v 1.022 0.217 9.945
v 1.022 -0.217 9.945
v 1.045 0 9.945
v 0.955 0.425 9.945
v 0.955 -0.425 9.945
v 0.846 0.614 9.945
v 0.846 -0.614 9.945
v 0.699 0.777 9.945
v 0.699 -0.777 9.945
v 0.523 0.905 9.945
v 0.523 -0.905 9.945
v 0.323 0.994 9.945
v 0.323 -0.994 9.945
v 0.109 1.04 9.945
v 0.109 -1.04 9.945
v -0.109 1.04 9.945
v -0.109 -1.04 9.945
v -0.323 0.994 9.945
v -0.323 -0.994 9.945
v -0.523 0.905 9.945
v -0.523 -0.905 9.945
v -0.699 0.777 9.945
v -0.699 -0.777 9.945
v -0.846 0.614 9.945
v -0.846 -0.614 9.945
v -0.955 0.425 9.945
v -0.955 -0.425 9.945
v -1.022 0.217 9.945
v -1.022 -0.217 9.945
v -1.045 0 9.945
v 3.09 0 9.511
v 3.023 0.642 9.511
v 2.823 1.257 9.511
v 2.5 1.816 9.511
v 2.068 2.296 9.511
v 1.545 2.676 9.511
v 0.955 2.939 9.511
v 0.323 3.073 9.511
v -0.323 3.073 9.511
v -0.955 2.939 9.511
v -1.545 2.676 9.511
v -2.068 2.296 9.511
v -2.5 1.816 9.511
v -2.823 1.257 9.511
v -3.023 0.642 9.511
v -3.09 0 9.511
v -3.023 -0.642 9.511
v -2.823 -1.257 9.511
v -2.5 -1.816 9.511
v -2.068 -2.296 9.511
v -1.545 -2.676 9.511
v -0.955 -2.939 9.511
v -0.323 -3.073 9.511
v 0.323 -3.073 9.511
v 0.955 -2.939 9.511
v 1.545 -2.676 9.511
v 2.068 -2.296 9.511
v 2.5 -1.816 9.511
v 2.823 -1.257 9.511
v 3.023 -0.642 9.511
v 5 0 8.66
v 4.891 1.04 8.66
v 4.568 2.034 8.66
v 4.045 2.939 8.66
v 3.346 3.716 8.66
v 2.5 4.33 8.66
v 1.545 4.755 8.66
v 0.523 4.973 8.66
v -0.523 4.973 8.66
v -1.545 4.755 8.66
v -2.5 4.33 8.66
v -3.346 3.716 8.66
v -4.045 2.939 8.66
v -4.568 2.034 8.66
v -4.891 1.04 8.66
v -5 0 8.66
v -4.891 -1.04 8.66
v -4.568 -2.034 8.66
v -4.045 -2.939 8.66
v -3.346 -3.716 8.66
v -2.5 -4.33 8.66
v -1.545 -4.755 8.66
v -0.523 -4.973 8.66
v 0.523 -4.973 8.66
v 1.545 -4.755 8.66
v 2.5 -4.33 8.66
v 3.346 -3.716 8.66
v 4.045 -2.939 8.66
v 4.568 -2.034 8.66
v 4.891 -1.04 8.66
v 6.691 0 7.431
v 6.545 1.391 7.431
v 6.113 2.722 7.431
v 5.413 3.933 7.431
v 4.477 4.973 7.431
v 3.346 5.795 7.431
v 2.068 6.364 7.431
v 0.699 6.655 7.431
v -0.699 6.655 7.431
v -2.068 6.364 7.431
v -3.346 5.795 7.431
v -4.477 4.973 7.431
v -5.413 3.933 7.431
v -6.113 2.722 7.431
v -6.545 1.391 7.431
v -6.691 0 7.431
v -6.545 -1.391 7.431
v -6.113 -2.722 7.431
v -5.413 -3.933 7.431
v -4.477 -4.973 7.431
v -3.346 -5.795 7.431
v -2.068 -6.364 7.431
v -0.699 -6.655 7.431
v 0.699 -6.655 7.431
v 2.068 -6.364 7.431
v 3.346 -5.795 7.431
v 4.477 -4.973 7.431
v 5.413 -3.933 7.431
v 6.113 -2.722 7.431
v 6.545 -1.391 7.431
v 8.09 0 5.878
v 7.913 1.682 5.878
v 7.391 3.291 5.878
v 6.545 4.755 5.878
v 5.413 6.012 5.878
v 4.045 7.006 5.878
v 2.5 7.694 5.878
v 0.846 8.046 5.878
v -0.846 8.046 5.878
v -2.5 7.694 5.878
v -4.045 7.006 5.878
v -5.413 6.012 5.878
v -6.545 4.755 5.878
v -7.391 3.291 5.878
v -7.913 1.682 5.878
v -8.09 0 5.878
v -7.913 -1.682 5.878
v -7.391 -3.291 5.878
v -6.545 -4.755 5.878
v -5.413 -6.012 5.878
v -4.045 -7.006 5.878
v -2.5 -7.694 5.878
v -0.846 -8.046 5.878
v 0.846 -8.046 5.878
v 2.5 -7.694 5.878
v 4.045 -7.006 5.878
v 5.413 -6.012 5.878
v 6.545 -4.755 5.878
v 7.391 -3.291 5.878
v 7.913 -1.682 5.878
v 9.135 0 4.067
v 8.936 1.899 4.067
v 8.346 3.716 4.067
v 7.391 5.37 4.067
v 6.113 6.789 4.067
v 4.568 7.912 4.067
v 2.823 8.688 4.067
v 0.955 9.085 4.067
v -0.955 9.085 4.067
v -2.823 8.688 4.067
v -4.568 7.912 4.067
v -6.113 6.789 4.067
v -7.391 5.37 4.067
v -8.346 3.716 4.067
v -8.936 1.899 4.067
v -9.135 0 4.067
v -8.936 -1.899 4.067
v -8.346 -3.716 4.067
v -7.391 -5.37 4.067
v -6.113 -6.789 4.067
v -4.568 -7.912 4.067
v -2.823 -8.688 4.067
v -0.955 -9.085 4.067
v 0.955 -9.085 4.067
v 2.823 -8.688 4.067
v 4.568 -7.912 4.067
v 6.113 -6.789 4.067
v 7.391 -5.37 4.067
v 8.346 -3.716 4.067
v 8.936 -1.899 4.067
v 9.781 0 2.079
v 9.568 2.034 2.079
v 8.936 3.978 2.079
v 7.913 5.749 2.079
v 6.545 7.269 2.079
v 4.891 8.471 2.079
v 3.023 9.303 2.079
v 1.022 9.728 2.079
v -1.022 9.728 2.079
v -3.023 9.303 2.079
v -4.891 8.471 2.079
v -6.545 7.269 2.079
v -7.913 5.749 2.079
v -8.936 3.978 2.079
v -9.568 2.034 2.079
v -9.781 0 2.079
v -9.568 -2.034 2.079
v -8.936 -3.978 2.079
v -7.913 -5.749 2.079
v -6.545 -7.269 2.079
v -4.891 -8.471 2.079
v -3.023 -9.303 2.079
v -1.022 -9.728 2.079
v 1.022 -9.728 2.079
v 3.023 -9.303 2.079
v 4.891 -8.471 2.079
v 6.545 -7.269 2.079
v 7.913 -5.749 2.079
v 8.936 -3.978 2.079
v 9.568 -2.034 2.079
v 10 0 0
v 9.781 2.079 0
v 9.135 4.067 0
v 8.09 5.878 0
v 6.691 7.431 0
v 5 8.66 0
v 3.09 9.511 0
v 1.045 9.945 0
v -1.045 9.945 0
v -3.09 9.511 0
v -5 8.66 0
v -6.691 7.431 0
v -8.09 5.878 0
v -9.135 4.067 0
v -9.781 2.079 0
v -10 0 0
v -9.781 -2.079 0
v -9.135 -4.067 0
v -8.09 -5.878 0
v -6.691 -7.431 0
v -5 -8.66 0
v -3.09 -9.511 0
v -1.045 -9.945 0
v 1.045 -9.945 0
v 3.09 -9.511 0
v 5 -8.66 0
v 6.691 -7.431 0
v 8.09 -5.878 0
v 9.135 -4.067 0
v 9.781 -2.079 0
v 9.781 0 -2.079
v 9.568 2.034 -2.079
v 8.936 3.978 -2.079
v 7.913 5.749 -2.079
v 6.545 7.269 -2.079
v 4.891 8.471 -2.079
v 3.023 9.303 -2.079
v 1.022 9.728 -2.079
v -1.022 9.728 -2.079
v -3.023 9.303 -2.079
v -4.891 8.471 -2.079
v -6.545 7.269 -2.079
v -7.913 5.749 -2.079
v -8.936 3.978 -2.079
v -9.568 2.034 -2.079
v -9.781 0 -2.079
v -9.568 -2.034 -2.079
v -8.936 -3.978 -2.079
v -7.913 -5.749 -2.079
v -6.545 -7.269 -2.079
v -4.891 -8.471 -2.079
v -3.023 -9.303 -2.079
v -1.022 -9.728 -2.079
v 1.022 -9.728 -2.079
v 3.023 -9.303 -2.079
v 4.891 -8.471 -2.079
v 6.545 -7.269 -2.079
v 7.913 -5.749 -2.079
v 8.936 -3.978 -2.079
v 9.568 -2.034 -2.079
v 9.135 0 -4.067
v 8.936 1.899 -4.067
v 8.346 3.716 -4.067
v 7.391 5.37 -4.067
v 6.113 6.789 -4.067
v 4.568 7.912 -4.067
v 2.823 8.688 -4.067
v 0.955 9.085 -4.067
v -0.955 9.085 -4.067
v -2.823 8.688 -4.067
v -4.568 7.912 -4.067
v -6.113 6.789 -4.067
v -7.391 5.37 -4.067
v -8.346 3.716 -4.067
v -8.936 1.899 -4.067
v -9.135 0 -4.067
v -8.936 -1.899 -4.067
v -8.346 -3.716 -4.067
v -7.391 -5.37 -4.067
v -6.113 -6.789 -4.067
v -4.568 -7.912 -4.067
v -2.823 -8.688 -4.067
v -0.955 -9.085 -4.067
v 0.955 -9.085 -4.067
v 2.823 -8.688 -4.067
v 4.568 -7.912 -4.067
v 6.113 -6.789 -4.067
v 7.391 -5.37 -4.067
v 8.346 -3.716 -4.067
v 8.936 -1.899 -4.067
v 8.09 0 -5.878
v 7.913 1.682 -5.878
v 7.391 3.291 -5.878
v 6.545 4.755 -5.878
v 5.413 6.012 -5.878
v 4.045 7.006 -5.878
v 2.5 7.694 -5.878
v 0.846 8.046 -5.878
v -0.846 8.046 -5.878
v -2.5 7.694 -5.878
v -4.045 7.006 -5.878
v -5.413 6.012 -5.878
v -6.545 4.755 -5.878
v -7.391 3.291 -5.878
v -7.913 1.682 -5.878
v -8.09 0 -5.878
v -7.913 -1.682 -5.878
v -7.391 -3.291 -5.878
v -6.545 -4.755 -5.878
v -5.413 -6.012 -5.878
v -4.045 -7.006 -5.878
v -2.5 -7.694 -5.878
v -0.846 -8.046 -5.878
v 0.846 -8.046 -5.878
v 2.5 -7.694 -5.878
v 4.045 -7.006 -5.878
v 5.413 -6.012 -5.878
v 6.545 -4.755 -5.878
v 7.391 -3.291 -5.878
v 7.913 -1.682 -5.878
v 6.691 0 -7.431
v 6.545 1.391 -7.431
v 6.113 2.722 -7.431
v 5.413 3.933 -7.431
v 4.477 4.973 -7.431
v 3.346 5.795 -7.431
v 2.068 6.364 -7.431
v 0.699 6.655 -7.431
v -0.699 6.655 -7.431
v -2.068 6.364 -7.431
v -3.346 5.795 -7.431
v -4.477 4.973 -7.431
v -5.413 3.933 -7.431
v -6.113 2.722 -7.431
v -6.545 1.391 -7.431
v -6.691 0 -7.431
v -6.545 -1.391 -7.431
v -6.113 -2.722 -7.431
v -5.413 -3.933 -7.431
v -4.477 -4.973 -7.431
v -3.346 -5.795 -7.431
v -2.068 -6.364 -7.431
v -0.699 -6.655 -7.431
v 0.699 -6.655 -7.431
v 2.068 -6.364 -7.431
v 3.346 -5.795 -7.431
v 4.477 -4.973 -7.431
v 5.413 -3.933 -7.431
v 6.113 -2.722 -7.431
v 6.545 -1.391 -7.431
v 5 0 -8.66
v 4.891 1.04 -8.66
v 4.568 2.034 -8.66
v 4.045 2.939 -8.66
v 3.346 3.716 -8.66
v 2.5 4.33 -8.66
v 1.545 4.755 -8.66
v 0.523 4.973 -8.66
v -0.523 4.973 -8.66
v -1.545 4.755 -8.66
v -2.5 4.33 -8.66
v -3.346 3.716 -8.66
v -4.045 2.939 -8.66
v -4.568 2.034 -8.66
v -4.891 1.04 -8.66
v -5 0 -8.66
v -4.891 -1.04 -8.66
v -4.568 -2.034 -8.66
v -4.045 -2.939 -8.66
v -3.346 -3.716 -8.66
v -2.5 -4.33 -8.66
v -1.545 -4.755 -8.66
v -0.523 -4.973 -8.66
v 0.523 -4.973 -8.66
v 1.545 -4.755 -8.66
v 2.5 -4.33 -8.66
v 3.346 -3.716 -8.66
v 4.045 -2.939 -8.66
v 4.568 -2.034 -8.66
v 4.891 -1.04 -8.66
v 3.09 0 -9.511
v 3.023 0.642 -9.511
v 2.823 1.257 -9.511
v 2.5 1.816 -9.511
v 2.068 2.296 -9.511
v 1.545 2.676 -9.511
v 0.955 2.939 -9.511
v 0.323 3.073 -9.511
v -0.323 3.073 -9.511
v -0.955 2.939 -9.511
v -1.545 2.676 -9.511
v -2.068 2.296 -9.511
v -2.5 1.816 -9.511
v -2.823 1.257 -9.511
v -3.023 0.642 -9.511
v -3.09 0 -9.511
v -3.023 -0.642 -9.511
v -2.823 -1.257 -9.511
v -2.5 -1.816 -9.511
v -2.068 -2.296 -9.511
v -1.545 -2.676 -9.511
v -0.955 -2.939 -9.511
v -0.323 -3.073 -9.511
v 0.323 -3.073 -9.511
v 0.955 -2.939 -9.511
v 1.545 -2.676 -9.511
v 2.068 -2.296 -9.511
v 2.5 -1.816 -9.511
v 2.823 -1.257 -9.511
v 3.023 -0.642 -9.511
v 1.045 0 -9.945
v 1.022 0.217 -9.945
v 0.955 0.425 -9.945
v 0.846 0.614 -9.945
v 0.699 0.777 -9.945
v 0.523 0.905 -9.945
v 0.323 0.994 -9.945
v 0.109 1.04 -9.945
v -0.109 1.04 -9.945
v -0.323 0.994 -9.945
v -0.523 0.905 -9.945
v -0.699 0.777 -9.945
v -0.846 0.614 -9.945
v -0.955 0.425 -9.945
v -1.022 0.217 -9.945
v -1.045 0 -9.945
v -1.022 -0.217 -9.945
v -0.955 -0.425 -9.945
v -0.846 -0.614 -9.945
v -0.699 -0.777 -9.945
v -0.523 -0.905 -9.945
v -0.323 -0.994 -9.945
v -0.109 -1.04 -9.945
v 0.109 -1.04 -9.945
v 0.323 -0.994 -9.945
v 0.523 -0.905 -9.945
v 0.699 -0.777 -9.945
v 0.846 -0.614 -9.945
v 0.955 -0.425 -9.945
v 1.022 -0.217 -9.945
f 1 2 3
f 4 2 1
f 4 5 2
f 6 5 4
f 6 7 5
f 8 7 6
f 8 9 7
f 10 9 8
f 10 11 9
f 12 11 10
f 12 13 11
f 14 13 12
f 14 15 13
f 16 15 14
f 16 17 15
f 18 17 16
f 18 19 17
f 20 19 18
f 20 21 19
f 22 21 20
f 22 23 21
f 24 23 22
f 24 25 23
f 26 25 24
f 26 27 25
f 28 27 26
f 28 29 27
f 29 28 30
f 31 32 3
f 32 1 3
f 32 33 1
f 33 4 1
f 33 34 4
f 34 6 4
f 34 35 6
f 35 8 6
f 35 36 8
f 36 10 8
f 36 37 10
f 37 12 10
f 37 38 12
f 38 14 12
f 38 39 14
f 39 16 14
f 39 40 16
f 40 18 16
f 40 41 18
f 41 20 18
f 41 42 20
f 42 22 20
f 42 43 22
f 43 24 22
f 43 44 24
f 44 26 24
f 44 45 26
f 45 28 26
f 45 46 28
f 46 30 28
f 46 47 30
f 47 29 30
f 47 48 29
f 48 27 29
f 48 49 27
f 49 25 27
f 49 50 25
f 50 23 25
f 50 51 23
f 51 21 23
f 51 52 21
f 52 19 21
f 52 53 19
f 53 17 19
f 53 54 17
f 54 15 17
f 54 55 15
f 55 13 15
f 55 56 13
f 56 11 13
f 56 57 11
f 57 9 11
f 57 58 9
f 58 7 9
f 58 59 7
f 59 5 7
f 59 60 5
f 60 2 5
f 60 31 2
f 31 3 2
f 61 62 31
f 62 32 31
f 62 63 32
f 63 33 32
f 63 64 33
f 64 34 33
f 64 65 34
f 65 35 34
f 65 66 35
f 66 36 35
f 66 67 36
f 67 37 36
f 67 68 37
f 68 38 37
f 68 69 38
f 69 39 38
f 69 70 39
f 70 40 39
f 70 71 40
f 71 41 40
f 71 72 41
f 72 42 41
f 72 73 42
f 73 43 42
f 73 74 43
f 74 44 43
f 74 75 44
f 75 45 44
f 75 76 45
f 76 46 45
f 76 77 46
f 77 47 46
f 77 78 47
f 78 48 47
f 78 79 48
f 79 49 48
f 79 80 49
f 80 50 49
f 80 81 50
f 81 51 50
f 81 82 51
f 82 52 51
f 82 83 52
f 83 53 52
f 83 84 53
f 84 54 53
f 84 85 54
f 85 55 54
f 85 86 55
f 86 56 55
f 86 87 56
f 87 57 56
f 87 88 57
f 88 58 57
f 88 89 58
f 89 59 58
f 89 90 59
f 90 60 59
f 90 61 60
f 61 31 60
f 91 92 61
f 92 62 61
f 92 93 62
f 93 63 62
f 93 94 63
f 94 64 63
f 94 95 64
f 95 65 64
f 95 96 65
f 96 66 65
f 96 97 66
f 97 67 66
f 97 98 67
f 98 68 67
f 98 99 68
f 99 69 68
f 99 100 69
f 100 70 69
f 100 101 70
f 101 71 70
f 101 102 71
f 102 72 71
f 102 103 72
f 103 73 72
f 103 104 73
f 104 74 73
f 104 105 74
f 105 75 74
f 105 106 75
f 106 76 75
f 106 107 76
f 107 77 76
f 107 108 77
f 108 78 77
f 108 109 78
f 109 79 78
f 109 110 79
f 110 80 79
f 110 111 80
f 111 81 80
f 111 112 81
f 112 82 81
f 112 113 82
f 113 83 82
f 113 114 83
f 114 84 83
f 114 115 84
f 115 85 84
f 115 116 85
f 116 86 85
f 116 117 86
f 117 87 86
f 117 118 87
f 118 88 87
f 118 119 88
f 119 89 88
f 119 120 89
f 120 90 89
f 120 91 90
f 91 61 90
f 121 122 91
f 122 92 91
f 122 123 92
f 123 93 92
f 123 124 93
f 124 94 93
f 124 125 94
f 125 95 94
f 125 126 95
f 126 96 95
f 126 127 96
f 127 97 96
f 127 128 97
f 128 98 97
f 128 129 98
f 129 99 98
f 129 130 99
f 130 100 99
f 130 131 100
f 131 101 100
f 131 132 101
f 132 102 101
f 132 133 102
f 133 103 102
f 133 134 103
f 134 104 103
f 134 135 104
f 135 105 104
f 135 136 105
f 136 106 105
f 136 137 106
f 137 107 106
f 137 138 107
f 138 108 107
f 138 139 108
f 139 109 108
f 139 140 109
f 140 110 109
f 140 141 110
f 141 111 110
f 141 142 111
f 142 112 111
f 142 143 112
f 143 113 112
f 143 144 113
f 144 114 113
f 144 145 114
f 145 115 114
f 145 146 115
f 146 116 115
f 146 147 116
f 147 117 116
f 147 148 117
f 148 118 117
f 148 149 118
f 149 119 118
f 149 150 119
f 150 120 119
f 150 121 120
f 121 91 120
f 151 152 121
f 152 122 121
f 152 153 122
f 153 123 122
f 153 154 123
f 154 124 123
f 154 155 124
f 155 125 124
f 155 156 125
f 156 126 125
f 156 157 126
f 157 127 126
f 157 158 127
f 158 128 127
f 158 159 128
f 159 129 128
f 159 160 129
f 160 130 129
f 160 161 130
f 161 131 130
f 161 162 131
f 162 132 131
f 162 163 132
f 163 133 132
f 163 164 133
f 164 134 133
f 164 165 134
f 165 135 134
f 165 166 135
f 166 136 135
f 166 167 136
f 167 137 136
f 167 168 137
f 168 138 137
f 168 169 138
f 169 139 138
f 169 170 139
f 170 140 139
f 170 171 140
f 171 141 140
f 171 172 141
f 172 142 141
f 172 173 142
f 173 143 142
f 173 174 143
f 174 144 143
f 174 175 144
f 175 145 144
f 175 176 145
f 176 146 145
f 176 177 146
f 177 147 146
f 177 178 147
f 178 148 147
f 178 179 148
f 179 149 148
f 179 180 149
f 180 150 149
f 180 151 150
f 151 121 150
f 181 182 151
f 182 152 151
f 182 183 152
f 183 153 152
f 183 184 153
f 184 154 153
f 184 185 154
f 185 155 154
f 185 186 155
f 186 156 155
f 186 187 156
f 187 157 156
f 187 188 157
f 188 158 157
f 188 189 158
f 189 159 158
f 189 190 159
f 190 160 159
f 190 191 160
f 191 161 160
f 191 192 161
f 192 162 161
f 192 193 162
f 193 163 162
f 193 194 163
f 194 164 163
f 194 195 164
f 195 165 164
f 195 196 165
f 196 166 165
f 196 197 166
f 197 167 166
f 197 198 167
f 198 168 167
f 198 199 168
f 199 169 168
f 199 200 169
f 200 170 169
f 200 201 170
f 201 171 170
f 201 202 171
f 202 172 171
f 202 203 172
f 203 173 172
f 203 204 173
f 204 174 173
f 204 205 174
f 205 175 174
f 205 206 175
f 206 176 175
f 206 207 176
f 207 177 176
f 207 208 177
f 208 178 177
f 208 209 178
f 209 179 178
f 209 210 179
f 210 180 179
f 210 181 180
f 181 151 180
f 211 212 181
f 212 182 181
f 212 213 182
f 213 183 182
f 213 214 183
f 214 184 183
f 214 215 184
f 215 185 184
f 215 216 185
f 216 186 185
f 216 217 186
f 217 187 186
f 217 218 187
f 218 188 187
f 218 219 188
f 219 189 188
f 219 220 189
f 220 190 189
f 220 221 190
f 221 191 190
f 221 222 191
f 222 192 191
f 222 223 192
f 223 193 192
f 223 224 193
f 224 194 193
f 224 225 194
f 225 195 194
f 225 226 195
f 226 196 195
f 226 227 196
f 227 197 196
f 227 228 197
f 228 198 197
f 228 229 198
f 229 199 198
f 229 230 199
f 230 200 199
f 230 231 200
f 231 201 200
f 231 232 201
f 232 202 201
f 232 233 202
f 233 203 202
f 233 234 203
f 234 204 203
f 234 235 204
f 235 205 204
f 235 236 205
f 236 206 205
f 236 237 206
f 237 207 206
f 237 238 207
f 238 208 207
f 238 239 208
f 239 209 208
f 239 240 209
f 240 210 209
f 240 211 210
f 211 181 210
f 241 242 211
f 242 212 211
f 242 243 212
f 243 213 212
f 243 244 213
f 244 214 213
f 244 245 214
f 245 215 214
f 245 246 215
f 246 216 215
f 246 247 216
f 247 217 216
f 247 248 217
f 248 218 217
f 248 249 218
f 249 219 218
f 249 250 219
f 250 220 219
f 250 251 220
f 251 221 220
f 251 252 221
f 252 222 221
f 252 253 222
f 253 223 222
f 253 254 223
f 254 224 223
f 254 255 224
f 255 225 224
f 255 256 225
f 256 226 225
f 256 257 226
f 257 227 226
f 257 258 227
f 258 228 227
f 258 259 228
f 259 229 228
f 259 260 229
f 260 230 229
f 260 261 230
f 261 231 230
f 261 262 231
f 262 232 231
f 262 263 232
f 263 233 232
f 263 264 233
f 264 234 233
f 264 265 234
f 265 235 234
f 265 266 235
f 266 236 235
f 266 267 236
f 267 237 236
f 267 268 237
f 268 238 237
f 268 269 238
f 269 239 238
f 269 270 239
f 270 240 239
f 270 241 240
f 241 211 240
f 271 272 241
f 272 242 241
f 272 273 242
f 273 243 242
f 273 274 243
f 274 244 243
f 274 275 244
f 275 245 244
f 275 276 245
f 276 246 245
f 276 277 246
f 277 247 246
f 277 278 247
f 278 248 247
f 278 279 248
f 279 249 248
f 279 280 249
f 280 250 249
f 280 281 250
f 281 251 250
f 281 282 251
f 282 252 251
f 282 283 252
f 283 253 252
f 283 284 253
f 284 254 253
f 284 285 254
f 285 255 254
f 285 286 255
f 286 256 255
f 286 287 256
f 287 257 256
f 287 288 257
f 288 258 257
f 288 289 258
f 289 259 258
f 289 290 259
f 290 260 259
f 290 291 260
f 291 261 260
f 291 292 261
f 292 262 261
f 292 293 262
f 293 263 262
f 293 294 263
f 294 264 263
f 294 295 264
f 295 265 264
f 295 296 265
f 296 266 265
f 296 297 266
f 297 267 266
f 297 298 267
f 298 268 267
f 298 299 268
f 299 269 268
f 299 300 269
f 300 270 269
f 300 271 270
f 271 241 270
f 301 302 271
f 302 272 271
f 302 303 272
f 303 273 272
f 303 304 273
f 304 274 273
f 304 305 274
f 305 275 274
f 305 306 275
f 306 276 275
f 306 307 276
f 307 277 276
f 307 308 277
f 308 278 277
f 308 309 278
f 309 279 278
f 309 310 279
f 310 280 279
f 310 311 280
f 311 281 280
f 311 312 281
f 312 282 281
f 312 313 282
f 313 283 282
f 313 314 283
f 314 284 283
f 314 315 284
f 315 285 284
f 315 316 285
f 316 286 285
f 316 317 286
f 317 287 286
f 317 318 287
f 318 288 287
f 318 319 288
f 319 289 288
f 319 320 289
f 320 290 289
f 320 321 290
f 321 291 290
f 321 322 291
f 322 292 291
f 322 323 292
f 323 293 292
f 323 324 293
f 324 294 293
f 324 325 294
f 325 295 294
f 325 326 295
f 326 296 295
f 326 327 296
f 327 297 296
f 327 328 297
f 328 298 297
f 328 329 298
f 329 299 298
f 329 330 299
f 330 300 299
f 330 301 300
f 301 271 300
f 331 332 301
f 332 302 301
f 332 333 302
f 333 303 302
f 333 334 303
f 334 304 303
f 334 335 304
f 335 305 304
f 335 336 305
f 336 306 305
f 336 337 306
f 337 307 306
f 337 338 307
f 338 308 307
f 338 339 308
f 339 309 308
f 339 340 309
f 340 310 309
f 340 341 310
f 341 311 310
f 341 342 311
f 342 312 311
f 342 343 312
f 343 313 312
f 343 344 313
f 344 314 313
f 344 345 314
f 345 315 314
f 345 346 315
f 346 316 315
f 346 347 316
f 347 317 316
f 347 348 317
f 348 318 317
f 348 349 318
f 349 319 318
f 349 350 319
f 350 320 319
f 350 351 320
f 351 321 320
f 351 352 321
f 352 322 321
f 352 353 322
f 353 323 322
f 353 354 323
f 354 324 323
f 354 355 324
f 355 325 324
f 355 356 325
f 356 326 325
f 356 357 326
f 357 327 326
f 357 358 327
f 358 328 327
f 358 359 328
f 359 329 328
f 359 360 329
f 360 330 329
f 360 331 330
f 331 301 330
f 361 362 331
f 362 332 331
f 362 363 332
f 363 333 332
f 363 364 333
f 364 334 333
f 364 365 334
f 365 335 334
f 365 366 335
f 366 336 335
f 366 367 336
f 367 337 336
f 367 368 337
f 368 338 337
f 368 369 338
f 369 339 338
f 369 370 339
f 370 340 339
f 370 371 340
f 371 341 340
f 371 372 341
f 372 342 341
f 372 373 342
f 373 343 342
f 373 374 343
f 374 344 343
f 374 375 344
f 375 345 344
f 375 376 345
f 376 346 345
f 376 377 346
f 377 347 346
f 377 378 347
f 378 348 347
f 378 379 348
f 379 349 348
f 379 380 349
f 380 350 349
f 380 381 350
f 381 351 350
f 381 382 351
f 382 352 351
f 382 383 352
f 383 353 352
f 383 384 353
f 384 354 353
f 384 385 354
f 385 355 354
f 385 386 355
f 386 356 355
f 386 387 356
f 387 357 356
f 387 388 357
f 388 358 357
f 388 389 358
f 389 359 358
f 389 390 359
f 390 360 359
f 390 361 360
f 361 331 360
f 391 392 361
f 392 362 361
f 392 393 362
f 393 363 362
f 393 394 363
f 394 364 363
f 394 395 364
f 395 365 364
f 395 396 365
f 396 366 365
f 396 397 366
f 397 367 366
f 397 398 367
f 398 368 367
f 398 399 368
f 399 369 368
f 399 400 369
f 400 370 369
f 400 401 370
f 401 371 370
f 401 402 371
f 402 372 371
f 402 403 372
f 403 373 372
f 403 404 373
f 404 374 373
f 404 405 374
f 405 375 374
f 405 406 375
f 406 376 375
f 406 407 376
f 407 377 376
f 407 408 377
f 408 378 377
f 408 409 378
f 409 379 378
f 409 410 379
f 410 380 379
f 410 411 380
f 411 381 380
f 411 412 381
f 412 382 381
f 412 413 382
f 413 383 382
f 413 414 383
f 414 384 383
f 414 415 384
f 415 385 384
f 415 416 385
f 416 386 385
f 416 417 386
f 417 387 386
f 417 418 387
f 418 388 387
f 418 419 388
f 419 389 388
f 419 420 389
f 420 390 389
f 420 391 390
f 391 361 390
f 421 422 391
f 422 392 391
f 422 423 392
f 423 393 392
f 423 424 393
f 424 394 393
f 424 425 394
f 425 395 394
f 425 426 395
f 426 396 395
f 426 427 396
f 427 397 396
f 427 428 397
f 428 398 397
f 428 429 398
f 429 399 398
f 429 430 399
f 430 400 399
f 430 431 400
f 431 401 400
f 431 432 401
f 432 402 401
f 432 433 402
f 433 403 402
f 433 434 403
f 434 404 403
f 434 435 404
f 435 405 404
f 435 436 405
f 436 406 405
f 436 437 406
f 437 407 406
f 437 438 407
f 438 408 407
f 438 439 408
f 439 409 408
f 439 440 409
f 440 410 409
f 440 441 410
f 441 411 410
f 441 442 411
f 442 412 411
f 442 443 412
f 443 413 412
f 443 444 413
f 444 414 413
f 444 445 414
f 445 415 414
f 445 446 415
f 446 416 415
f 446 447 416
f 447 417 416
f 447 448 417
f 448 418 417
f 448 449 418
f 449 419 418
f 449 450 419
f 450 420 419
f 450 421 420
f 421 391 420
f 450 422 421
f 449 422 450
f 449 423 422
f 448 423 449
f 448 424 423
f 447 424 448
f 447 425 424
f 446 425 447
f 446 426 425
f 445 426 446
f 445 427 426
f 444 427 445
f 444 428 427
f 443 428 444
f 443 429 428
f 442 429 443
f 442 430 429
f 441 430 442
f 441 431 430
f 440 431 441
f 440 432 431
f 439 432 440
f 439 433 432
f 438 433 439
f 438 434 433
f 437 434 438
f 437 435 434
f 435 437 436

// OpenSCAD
// OpenSCAD 
// converted from BlockSCAD XML by nicescad's blockscad converter
// according to 
// https://github.com/WolfgangFahl/nicescad/issues/23
// support reading and converting blockscad files #23

color("green");
sphere(10,center=false);
